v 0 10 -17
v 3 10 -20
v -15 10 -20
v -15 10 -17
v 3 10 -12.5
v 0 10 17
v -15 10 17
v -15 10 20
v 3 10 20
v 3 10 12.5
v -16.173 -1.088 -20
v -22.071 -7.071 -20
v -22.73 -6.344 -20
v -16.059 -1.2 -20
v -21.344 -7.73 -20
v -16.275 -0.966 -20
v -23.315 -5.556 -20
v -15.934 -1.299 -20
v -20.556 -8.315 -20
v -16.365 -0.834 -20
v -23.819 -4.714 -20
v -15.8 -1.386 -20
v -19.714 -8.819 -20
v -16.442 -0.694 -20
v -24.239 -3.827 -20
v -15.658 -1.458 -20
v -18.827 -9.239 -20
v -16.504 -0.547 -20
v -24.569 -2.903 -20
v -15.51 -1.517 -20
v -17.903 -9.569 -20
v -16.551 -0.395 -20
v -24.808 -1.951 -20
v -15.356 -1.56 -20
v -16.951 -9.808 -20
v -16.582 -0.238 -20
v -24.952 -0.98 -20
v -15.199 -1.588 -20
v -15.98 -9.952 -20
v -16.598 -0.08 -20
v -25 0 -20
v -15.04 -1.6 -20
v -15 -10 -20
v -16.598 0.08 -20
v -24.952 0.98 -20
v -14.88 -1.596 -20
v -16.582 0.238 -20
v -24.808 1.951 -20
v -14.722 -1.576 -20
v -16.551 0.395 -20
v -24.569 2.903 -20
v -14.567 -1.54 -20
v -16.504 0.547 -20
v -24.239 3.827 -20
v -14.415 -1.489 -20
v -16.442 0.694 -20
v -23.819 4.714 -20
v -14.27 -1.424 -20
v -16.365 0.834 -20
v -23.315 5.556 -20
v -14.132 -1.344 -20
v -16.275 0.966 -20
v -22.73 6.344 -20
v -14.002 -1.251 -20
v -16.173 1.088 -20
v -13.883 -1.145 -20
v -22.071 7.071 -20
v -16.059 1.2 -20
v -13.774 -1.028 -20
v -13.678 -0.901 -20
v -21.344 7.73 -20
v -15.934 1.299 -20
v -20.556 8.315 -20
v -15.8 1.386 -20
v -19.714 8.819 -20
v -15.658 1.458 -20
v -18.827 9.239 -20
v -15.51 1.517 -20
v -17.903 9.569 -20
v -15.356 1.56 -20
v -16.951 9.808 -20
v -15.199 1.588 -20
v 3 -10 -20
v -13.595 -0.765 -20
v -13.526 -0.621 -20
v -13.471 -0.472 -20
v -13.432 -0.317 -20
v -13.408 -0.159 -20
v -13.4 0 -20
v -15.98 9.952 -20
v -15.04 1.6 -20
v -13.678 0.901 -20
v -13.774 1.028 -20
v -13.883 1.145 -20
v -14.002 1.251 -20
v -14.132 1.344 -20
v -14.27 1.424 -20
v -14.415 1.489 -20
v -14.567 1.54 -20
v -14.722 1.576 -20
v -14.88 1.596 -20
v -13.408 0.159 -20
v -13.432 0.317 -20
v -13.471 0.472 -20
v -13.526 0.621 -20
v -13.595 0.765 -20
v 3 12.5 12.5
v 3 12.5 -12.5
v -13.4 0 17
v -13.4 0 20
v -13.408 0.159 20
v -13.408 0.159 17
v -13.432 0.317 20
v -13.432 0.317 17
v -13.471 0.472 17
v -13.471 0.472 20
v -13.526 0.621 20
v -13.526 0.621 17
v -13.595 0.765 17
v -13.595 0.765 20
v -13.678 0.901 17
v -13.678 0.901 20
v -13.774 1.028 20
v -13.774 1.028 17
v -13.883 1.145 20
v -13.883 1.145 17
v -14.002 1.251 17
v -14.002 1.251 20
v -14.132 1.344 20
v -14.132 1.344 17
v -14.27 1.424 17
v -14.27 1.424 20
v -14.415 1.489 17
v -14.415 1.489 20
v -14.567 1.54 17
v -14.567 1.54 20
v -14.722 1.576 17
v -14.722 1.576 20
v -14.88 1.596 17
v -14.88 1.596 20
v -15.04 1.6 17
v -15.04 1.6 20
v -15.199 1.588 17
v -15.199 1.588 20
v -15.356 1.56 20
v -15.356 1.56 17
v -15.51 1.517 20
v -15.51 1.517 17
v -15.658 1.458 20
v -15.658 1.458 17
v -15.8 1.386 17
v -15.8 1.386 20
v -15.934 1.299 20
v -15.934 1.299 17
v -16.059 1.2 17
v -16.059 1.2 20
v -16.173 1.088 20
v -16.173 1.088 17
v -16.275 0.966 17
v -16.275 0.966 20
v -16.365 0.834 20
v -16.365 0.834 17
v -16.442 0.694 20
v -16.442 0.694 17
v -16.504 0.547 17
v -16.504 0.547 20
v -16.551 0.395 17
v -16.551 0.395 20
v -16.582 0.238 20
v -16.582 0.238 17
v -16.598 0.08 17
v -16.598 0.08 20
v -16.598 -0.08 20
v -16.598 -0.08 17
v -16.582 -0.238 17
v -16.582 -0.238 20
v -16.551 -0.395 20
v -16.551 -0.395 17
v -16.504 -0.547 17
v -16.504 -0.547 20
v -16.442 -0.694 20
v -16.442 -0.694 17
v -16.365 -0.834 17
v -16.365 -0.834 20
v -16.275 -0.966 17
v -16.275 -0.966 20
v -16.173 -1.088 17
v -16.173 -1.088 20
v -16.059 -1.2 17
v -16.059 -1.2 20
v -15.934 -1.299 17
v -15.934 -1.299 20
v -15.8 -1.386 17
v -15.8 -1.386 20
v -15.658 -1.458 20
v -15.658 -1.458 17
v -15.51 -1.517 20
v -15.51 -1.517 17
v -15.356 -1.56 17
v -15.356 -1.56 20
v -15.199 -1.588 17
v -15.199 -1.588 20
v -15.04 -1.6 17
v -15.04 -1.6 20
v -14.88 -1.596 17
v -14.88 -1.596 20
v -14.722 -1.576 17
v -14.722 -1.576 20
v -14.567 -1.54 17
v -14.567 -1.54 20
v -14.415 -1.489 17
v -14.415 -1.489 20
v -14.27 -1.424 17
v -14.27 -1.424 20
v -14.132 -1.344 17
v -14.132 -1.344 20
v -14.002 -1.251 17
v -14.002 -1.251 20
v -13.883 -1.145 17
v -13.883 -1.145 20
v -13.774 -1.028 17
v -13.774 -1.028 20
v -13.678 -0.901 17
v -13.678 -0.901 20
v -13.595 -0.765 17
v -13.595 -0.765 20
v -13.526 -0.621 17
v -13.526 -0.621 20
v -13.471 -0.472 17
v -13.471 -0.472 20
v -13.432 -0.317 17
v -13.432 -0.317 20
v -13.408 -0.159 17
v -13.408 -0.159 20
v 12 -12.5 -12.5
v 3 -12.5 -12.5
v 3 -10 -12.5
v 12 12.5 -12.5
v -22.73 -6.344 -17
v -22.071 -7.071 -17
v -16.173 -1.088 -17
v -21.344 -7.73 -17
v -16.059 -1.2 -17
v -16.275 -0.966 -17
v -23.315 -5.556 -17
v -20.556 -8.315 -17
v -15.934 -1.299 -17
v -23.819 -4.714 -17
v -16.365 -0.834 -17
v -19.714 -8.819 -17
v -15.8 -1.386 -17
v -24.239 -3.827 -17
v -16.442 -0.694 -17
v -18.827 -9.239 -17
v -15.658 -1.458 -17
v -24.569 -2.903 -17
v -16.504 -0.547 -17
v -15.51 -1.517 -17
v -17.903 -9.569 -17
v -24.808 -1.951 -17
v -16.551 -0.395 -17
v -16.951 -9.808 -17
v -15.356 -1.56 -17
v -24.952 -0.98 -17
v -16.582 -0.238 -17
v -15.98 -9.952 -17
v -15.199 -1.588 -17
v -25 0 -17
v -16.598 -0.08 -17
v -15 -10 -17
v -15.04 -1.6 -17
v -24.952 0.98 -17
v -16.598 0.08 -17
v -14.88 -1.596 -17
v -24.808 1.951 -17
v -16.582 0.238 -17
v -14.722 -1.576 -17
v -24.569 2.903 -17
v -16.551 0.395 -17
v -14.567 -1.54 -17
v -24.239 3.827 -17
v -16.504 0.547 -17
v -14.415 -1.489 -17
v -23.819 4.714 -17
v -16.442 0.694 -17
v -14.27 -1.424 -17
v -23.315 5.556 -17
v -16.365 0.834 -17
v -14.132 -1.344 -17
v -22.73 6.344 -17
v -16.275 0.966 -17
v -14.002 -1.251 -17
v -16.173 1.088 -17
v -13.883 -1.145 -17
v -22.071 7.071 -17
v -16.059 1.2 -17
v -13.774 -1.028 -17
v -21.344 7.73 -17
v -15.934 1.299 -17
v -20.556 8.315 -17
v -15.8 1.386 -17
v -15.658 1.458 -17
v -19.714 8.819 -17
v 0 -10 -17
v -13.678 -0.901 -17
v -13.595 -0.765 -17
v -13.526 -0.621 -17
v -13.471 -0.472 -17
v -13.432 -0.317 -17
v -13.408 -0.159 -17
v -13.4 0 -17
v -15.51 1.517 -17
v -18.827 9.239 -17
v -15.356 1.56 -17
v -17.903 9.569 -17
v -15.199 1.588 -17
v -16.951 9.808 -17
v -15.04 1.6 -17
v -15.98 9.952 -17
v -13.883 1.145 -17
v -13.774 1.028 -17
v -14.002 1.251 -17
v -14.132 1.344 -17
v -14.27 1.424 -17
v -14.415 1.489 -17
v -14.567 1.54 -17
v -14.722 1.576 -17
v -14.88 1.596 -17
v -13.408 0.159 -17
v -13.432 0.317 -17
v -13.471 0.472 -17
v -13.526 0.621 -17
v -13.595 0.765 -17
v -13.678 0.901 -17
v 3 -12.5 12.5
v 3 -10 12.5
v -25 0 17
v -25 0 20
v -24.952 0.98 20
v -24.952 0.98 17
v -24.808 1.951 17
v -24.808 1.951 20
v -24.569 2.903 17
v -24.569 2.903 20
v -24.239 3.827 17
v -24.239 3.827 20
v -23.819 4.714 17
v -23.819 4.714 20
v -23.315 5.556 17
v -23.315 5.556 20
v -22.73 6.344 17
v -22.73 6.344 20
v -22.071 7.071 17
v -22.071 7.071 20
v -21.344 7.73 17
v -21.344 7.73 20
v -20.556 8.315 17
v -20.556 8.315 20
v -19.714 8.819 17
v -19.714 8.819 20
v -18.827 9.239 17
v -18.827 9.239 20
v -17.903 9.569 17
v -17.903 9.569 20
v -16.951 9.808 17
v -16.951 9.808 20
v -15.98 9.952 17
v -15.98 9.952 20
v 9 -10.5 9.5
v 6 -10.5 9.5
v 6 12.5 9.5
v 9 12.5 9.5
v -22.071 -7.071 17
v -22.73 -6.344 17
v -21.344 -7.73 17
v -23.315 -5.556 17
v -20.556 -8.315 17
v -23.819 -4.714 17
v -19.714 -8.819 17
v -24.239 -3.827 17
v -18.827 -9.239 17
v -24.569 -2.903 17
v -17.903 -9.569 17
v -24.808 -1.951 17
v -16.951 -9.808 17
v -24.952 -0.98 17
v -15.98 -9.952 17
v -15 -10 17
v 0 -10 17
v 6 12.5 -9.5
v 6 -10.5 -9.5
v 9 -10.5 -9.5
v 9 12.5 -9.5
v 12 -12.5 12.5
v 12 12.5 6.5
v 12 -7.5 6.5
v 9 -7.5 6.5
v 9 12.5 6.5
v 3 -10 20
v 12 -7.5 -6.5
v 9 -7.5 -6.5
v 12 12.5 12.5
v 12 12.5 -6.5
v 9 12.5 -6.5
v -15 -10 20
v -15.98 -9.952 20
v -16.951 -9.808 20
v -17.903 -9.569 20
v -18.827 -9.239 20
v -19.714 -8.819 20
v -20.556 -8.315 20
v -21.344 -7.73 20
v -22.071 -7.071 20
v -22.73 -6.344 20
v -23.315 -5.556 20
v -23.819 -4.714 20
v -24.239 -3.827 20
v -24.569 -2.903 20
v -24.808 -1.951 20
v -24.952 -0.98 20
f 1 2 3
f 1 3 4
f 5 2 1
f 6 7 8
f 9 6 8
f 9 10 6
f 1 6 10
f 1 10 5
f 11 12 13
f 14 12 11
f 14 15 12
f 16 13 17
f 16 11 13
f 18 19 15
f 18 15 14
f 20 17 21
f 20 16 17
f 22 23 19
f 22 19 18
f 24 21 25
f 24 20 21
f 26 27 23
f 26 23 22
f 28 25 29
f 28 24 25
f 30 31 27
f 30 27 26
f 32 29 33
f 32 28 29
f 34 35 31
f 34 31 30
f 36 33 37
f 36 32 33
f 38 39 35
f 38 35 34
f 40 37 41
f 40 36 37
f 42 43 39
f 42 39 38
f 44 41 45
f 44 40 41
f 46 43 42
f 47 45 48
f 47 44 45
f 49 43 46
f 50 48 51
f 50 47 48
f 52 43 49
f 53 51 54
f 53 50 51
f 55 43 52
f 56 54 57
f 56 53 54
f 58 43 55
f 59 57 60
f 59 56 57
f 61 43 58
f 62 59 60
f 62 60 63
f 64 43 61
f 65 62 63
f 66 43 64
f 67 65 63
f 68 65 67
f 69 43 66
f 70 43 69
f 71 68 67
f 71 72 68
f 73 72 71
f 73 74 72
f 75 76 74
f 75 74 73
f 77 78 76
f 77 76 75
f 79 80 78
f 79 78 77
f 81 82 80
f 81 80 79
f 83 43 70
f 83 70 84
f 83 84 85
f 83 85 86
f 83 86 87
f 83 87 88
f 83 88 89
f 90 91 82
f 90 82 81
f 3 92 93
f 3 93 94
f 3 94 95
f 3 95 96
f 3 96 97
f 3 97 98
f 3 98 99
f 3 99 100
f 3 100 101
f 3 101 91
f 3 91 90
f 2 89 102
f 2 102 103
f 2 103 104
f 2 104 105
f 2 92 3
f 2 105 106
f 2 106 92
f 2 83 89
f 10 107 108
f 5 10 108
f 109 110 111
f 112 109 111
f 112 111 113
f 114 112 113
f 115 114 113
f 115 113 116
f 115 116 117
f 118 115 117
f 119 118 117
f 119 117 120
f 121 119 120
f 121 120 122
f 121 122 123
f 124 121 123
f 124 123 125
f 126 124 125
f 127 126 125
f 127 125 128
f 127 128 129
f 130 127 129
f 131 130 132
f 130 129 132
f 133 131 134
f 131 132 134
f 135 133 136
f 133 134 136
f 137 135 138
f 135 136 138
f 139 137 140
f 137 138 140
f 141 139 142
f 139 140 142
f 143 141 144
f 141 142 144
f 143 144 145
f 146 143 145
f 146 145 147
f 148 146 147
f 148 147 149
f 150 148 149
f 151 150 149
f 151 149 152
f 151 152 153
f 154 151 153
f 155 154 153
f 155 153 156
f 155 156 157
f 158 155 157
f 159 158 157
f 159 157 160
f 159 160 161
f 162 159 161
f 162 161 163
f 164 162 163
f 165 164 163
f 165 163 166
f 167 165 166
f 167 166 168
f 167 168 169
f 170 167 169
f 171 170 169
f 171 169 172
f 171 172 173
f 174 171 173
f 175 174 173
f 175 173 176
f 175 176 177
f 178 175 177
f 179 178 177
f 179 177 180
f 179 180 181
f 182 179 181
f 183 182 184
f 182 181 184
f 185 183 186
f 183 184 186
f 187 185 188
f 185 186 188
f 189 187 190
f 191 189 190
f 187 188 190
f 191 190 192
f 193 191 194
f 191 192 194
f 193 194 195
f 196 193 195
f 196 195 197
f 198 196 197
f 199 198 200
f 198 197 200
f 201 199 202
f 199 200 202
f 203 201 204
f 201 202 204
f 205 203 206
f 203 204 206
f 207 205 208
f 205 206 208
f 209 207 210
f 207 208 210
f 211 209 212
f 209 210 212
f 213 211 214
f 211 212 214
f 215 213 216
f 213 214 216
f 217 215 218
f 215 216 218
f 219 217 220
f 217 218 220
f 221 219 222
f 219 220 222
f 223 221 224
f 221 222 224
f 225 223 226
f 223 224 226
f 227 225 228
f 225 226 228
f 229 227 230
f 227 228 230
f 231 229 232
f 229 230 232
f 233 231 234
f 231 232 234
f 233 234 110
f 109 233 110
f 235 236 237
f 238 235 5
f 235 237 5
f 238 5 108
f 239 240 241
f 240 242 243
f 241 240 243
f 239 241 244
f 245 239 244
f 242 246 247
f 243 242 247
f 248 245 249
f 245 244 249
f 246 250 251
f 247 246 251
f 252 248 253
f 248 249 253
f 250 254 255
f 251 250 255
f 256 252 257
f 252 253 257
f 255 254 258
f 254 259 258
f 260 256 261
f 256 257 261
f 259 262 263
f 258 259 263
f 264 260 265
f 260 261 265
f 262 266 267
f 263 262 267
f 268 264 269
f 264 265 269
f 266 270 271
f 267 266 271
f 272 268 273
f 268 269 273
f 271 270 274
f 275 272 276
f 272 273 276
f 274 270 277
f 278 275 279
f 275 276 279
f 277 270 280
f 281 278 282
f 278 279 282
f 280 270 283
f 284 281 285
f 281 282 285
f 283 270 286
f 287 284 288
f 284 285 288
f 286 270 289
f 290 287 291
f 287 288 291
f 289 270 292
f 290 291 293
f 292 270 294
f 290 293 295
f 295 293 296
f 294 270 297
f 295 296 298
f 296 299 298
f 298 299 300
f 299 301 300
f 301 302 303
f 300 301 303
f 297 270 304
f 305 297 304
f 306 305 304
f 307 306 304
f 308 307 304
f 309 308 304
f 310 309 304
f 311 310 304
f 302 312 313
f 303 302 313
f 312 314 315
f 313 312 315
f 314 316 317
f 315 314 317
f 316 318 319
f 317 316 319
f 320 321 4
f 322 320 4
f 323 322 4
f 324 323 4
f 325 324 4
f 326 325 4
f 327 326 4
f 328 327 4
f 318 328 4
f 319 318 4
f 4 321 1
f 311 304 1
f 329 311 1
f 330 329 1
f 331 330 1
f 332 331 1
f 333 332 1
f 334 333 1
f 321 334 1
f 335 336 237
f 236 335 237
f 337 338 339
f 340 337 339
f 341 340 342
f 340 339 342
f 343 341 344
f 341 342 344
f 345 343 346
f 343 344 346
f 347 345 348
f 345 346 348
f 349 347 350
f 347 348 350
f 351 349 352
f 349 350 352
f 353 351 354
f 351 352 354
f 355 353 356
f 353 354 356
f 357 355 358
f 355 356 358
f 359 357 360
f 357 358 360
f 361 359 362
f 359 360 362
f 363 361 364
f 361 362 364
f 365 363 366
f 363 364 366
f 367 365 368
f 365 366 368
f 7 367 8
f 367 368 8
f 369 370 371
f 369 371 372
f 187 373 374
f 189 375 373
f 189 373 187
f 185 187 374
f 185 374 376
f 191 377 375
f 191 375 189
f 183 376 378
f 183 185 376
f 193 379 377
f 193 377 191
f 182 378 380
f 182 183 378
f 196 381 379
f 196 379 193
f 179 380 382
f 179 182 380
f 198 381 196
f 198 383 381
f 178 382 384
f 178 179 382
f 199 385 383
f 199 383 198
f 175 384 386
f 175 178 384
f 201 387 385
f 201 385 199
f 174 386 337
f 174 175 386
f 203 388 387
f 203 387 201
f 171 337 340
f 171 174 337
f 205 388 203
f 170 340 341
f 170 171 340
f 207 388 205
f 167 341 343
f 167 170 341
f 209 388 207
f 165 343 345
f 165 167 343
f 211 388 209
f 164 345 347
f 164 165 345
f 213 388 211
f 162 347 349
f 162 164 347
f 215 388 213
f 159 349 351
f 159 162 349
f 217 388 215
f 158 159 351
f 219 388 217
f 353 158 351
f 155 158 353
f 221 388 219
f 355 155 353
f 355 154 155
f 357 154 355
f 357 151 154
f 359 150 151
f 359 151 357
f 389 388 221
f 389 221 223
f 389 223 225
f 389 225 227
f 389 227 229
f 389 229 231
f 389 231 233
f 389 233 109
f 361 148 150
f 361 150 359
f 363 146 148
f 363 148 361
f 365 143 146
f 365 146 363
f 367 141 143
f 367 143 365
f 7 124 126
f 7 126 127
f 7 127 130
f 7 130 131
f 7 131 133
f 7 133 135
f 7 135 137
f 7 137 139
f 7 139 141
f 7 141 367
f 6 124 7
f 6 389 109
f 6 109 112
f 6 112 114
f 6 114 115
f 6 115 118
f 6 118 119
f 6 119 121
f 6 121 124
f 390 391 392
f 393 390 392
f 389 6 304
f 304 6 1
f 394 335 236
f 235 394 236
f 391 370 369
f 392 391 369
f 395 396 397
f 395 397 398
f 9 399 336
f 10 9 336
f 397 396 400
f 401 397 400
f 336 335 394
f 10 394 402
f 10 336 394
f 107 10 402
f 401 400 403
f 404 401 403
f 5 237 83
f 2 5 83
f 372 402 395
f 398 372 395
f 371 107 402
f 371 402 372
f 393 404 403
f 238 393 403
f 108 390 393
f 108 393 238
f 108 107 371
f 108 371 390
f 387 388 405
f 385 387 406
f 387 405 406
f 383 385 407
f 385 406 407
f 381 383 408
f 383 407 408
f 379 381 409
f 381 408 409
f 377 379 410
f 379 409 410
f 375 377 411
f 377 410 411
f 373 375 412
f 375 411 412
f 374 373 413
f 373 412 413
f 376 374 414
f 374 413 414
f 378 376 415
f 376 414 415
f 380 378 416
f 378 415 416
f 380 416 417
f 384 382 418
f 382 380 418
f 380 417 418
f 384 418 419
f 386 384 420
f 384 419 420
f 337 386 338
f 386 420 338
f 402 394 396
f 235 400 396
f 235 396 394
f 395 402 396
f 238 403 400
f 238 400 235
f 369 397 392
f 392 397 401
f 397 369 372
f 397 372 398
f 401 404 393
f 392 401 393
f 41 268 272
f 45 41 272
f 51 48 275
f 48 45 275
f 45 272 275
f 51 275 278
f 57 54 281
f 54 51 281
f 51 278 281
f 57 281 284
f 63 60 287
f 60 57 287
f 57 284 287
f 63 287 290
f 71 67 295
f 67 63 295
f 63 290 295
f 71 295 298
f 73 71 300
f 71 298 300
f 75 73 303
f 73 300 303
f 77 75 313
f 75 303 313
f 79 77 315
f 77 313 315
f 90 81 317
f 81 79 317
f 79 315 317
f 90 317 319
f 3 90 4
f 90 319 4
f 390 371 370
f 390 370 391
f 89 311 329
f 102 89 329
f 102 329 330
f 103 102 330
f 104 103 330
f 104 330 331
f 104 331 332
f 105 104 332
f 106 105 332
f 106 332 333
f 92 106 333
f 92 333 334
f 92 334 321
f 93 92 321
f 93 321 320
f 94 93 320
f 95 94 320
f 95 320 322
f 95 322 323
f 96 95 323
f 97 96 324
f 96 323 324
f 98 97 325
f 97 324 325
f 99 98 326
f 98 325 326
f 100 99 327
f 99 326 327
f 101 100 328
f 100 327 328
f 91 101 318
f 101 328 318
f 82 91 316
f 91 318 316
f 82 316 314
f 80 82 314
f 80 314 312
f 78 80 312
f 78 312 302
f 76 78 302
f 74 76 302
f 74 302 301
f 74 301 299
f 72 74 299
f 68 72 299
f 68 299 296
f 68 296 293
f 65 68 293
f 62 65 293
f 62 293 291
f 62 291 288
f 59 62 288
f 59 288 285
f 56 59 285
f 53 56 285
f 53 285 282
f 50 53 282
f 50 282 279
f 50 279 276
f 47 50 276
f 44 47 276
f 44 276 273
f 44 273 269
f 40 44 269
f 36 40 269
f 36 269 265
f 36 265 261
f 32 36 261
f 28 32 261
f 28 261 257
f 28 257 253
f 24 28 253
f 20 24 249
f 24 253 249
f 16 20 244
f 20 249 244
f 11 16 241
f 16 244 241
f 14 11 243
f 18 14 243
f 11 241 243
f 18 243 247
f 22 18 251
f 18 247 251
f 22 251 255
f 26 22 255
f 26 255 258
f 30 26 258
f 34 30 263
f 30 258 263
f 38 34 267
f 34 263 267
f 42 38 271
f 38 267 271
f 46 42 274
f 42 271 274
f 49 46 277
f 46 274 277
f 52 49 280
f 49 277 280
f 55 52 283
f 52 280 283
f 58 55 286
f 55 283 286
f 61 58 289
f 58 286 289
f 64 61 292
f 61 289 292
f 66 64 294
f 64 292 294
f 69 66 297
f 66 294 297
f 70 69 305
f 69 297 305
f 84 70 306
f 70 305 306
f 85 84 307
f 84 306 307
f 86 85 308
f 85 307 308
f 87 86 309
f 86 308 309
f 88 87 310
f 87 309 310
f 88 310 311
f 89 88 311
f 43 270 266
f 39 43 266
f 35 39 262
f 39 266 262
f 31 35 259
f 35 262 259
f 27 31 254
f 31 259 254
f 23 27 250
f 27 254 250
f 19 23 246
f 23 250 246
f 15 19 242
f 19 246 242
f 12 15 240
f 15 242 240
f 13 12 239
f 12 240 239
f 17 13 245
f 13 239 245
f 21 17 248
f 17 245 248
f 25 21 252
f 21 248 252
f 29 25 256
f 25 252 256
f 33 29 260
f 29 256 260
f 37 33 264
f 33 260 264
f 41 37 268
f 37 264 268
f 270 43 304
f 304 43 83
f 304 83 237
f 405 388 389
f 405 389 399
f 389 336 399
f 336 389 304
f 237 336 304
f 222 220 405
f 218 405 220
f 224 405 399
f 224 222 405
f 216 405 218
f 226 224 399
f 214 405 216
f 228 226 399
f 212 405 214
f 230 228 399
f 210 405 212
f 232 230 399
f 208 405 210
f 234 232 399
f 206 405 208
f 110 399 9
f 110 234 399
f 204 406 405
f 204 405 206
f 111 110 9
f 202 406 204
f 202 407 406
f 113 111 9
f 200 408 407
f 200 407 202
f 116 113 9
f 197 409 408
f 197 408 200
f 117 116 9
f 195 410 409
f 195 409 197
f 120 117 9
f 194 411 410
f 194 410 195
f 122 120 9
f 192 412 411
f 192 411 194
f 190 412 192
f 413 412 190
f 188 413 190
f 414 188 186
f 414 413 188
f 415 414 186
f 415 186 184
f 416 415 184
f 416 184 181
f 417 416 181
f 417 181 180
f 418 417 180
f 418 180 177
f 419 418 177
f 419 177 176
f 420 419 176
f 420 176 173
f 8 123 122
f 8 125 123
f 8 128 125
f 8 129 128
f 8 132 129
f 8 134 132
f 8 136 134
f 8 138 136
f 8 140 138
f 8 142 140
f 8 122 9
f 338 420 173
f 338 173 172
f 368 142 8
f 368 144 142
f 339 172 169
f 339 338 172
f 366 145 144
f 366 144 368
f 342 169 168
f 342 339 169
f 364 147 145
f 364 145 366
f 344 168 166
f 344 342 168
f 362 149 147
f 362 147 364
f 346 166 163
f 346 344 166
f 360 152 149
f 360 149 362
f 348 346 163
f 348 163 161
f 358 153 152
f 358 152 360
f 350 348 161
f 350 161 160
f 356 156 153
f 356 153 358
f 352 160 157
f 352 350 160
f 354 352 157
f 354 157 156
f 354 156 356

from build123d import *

# Parameters (mm, degrees)
ESQUISSE1_W             = 40
ESQUISSE1_H             = 20
BOSS_EXTRU_1_DEPTH      = 3
ESQUISSE2_W             = 3
ESQUISSE2_H             = 20
BOSS_EXTRU_2_DEPTH      = 25
ENL_V_MAT_EXTRU_1_DEPTH = 48
ESQUISSE4_R             = 1.6
ENL_V_MAT_EXTRU_2_DEPTH = 48
ESQUISSE5_W             = 25
ESQUISSE5_H             = 25
BOSS_EXTRU_3_DEPTH      = 9
ESQUISSE6_W             = 3
ESQUISSE6_H             = 19
ENL_V_MAT_EXTRU_4_DEPTH = 23
ESQUISSE8_W             = 13
ESQUISSE8_H             = 20
ENL_V_MAT_EXTRU_5_DEPTH = 3


with BuildPart() as part:
    # Esquisse1 → Boss.-Extru.1 (new body)
    with BuildSketch(Plane(origin=(0, 0, 0), x_dir=(0, 0, -1), z_dir=(1, 0, 0))):
        Rectangle(ESQUISSE1_W, ESQUISSE1_H)
    extrude(amount=BOSS_EXTRU_1_DEPTH)

    # Esquisse2 → Boss.-Extru.2 (add)
    with BuildSketch(Plane.ZY):
        with Locations((-18.5, 0)):
            Rectangle(ESQUISSE2_W, ESQUISSE2_H)
        with Locations((18.5, 0)):
            Rectangle(ESQUISSE2_W, ESQUISSE2_H)
    extrude(amount=BOSS_EXTRU_2_DEPTH)

    # Esquisse3 → Enlèv. mat.-Extru.1 (cut)
    with BuildSketch(Plane.XY.offset(20)):
        with BuildLine():
            ThreePointArc((-25, 2.7e-08), (-22.071067802, 7.071067821), (-15, 10))
            Line((-15, 10), (-25, 10))
            Line((-25, 10), (-25, 2.7e-08))
        make_face()
        with BuildLine():
            ThreePointArc((-15, -10), (-22.071067821, -7.071067802), (-25, 2.7e-08))
            Line((-25, 2.7e-08), (-25, -10))
            Line((-25, -10), (-15, -10))
        make_face()
    extrude(amount=-ENL_V_MAT_EXTRU_1_DEPTH, mode=Mode.SUBTRACT)

    # Esquisse4 → Enlèv. mat.-Extru.2 (cut)
    with BuildSketch(Plane.XY.offset(20)):
        with Locations((-15, 0)):
            Circle(ESQUISSE4_R)
    extrude(amount=-ENL_V_MAT_EXTRU_2_DEPTH, mode=Mode.SUBTRACT)

    # Esquisse5 → Boss.-Extru.3 (add)
    with BuildSketch(Plane(origin=(3, 0, 0), x_dir=(0, 0, -1), z_dir=(1, 0, 0))):
        Rectangle(ESQUISSE5_W, ESQUISSE5_H)
    extrude(amount=BOSS_EXTRU_3_DEPTH)

    # Esquisse6 → Enlèv. mat.-Extru.4 (cut)
    with BuildSketch(Plane(origin=(0, 12.5, 0), x_dir=(1, 0, 0), z_dir=(0, 1, 0))):
        with Locations((7.5, 0)):
            Rectangle(ESQUISSE6_W, ESQUISSE6_H)
    extrude(amount=-ENL_V_MAT_EXTRU_4_DEPTH, mode=Mode.SUBTRACT)

    # Esquisse8 → Enlèv. mat.-Extru.5 (cut)
    with BuildSketch(Plane(origin=(12, 0, 0), x_dir=(0, 0, -1), z_dir=(1, 0, 0))):
        with Locations((0, 2.5)):
            Rectangle(ESQUISSE8_W, ESQUISSE8_H)
    extrude(amount=-ENL_V_MAT_EXTRU_5_DEPTH, mode=Mode.SUBTRACT)


solid = part.part
